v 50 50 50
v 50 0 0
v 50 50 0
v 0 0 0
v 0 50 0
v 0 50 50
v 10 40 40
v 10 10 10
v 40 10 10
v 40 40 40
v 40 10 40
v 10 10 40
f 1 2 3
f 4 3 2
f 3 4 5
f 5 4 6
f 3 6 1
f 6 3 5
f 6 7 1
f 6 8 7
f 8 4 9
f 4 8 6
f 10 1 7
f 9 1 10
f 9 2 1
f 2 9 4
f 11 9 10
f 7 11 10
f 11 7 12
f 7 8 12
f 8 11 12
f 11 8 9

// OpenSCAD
difference() {
    cube([50,50,50]);
    rotate([-45,0,0])
    translate([-1, -50, 0])
    cube([52, 50, 100]);
}

translate([10,10,10])
cube([30,30,30]);
